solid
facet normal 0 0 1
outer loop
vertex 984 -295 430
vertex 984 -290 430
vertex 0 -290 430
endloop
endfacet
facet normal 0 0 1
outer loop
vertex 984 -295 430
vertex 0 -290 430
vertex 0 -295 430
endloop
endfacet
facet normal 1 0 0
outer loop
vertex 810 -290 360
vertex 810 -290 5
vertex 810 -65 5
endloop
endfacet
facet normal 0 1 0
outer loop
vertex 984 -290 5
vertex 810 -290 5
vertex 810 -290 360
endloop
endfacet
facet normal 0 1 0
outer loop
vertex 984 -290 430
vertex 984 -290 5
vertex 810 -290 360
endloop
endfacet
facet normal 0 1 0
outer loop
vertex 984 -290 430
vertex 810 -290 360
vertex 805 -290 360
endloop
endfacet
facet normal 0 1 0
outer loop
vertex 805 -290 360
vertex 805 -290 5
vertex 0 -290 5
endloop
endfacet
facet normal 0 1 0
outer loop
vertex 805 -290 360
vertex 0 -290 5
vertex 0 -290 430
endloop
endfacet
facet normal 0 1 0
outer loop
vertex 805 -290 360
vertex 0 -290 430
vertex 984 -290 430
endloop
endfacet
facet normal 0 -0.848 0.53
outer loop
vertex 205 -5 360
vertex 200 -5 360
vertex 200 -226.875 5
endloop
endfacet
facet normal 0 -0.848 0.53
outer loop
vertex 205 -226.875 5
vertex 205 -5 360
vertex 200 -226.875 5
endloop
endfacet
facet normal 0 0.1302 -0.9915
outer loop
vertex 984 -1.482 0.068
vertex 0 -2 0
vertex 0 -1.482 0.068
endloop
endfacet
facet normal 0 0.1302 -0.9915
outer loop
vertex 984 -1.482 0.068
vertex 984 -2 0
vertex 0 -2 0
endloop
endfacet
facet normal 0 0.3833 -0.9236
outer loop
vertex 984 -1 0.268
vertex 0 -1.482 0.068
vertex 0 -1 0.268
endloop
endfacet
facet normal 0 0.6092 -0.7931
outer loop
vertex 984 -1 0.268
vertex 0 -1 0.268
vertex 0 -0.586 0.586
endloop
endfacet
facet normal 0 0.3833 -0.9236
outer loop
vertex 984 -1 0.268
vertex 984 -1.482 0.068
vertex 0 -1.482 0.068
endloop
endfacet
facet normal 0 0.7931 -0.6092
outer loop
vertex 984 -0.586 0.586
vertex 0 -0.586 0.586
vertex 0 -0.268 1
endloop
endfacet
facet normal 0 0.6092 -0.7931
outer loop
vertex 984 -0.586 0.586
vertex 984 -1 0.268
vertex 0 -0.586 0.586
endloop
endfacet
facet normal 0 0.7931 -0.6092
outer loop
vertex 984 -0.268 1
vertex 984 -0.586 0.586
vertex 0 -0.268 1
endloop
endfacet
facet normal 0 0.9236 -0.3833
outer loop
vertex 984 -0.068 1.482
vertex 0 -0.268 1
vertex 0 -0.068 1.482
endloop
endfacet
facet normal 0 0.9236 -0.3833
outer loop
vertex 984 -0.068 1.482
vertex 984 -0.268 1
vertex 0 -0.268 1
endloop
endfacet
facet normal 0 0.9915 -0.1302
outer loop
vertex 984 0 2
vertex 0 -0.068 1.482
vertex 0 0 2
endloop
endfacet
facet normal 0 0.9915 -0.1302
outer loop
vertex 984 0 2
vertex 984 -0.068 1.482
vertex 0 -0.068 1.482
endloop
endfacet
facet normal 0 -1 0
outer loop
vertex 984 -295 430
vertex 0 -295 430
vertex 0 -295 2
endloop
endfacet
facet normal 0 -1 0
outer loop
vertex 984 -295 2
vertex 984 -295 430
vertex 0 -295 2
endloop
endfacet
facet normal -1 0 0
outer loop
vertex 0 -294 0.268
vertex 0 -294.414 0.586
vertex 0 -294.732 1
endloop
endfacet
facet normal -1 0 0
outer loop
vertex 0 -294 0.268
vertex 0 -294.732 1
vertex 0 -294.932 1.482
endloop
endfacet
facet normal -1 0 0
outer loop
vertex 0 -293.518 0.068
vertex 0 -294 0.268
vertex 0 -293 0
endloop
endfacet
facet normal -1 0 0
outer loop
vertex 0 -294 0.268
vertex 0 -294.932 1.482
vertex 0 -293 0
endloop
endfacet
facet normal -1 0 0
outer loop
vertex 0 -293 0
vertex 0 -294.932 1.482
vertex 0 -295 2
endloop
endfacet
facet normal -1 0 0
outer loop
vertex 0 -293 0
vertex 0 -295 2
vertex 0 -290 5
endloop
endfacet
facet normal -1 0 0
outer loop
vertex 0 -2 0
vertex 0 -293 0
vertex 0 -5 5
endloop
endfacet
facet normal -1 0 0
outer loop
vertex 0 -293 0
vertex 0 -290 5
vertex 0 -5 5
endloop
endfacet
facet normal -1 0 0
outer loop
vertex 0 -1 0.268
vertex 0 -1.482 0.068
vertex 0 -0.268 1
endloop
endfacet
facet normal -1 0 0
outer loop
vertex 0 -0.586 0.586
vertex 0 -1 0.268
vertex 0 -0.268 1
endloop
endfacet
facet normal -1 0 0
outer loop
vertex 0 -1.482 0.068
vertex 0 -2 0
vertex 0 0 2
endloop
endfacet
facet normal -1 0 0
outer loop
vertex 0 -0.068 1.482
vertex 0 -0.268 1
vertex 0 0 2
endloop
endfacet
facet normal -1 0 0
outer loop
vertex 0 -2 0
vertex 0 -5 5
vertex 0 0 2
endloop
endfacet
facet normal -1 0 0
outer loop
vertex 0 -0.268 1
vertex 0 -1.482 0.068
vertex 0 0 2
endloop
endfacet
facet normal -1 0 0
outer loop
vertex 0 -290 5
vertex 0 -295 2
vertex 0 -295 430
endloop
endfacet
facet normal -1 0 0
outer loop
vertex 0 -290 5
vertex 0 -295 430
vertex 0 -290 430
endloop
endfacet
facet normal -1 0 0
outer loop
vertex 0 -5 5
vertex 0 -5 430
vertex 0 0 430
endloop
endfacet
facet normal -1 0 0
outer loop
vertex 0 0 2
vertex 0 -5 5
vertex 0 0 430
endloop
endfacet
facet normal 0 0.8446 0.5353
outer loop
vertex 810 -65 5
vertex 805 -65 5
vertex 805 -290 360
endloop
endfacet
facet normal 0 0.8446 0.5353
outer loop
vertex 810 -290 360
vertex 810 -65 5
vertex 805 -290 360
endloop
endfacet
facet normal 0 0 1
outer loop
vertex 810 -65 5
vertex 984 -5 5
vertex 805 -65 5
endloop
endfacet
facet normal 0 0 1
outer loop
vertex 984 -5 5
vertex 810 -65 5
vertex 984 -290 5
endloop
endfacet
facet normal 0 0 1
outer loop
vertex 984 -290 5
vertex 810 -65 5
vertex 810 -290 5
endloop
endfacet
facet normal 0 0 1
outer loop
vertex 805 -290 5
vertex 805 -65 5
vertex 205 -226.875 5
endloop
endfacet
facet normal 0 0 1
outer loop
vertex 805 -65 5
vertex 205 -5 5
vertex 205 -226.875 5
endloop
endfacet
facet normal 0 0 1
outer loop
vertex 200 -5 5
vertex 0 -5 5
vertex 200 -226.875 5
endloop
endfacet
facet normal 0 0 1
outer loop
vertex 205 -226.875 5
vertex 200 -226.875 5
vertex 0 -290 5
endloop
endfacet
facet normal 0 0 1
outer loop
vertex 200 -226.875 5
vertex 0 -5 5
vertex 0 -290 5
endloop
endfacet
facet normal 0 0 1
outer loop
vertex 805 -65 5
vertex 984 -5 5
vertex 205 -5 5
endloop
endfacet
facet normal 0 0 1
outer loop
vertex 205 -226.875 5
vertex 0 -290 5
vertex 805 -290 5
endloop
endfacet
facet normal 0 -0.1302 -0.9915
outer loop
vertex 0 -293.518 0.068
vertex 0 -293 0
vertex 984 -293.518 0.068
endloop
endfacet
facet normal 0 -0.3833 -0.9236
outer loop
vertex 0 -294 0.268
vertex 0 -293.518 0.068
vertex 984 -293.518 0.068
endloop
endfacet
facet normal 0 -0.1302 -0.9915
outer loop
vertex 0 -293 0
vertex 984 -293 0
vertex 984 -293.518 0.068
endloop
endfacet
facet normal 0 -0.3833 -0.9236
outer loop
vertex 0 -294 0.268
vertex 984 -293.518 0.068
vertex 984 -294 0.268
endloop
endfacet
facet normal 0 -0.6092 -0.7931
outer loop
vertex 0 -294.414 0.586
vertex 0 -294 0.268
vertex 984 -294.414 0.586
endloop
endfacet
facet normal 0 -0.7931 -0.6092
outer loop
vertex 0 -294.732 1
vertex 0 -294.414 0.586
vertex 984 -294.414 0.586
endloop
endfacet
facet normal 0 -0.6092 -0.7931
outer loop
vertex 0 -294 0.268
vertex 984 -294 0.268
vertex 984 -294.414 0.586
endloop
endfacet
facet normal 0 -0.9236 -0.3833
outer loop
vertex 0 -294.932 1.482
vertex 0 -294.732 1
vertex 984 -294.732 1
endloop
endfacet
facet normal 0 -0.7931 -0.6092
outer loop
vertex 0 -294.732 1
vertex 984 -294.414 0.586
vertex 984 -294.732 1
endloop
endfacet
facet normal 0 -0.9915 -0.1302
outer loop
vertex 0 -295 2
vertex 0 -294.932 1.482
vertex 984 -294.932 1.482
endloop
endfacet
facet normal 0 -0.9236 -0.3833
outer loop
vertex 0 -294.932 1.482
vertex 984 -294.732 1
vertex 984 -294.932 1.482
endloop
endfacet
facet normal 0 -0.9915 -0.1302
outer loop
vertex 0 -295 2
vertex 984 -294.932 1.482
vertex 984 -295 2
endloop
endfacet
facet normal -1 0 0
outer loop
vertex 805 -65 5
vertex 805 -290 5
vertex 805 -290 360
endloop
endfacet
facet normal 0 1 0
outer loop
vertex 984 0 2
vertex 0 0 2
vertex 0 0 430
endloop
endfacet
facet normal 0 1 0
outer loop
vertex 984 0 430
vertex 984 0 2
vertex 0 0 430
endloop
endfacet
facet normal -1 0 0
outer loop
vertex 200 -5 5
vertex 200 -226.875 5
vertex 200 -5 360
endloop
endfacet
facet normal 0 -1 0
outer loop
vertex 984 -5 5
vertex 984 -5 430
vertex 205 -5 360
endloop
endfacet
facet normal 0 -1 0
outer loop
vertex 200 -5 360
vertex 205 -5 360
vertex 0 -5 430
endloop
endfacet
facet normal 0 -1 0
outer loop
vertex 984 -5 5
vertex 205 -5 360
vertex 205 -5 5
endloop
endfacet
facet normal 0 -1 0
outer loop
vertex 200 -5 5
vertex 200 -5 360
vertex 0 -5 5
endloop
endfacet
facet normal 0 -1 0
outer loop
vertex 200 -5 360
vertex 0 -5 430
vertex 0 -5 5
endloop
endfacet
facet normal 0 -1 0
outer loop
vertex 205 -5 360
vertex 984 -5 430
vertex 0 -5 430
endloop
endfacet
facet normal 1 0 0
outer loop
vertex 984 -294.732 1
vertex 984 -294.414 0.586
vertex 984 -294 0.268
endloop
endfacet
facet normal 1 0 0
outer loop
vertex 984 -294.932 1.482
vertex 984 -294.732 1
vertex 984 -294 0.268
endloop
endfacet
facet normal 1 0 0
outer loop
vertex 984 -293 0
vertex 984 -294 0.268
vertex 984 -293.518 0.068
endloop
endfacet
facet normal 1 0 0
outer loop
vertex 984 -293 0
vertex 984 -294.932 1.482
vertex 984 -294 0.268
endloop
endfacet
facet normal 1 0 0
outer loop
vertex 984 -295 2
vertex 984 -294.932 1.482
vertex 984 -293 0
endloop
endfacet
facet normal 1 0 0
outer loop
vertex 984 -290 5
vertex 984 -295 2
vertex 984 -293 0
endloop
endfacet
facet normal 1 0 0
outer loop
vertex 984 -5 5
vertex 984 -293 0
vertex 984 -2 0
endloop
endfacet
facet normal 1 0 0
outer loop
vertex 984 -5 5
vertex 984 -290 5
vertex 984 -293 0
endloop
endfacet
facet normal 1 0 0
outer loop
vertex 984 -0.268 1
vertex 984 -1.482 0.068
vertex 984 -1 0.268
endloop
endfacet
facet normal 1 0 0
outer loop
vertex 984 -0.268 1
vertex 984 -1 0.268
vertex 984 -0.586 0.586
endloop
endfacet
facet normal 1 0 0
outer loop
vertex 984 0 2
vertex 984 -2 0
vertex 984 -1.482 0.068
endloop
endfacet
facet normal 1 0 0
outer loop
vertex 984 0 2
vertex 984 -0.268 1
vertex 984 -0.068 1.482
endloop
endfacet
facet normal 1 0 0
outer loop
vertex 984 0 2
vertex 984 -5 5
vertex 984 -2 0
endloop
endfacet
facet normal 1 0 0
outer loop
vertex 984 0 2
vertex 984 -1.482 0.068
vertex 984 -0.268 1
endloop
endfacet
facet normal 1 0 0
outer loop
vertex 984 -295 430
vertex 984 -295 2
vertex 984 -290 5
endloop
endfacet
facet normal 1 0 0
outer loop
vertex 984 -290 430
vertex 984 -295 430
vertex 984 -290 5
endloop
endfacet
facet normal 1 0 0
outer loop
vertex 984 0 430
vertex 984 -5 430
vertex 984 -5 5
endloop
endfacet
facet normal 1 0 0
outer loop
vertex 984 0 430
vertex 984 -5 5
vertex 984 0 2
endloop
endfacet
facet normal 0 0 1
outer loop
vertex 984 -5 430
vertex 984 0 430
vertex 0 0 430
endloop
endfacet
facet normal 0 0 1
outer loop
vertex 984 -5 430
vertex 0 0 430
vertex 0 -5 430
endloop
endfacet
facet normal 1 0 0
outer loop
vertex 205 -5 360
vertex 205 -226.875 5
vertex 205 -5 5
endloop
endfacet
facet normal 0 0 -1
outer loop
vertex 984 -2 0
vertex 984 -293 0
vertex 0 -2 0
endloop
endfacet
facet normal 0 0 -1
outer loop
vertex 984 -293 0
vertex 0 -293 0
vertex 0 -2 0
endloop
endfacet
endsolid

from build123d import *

# Parameters (mm, degrees)
F1_DEPTH = 984
F4_DEPTH = 5
F7_DEPTH = 5
F8_R     = 2


# Not quite as in the source:
# - a feature names something its author has since deleted; it is built from what else it names


with BuildPart() as f1:
    # F0 (on Right) → F1 (new body)
    with BuildSketch(Plane.YZ):
        Polygon((-295, 0), (0, 0), (0, 430), (-5, 430), (-5, 5), (-290, 5), (-290, 430), (-295, 430), align=None)
    extrude(amount=F1_DEPTH)

    # F3 (on offset) → F4 (join)
    with BuildSketch(Plane.YZ.offset(200)):
        Polygon((-230, 0), (-5, 0), (-5, 360), align=None)
    extrude(amount=F4_DEPTH)

    # F6 (on offset) → F7 (join)
    with BuildSketch(Plane.YZ.offset(805)):
        Polygon((-290, 360), (-290, 5), (-65, 5), align=None)
    extrude(amount=F7_DEPTH)

    # F8
    f8_edges = [f1.edges().sort_by_distance(p)[0] for p in [
        (492, 0, 0),
        (492, -295, 0),
    ]]
    fillet(f8_edges, radius=F8_R)


solid = f1.part
